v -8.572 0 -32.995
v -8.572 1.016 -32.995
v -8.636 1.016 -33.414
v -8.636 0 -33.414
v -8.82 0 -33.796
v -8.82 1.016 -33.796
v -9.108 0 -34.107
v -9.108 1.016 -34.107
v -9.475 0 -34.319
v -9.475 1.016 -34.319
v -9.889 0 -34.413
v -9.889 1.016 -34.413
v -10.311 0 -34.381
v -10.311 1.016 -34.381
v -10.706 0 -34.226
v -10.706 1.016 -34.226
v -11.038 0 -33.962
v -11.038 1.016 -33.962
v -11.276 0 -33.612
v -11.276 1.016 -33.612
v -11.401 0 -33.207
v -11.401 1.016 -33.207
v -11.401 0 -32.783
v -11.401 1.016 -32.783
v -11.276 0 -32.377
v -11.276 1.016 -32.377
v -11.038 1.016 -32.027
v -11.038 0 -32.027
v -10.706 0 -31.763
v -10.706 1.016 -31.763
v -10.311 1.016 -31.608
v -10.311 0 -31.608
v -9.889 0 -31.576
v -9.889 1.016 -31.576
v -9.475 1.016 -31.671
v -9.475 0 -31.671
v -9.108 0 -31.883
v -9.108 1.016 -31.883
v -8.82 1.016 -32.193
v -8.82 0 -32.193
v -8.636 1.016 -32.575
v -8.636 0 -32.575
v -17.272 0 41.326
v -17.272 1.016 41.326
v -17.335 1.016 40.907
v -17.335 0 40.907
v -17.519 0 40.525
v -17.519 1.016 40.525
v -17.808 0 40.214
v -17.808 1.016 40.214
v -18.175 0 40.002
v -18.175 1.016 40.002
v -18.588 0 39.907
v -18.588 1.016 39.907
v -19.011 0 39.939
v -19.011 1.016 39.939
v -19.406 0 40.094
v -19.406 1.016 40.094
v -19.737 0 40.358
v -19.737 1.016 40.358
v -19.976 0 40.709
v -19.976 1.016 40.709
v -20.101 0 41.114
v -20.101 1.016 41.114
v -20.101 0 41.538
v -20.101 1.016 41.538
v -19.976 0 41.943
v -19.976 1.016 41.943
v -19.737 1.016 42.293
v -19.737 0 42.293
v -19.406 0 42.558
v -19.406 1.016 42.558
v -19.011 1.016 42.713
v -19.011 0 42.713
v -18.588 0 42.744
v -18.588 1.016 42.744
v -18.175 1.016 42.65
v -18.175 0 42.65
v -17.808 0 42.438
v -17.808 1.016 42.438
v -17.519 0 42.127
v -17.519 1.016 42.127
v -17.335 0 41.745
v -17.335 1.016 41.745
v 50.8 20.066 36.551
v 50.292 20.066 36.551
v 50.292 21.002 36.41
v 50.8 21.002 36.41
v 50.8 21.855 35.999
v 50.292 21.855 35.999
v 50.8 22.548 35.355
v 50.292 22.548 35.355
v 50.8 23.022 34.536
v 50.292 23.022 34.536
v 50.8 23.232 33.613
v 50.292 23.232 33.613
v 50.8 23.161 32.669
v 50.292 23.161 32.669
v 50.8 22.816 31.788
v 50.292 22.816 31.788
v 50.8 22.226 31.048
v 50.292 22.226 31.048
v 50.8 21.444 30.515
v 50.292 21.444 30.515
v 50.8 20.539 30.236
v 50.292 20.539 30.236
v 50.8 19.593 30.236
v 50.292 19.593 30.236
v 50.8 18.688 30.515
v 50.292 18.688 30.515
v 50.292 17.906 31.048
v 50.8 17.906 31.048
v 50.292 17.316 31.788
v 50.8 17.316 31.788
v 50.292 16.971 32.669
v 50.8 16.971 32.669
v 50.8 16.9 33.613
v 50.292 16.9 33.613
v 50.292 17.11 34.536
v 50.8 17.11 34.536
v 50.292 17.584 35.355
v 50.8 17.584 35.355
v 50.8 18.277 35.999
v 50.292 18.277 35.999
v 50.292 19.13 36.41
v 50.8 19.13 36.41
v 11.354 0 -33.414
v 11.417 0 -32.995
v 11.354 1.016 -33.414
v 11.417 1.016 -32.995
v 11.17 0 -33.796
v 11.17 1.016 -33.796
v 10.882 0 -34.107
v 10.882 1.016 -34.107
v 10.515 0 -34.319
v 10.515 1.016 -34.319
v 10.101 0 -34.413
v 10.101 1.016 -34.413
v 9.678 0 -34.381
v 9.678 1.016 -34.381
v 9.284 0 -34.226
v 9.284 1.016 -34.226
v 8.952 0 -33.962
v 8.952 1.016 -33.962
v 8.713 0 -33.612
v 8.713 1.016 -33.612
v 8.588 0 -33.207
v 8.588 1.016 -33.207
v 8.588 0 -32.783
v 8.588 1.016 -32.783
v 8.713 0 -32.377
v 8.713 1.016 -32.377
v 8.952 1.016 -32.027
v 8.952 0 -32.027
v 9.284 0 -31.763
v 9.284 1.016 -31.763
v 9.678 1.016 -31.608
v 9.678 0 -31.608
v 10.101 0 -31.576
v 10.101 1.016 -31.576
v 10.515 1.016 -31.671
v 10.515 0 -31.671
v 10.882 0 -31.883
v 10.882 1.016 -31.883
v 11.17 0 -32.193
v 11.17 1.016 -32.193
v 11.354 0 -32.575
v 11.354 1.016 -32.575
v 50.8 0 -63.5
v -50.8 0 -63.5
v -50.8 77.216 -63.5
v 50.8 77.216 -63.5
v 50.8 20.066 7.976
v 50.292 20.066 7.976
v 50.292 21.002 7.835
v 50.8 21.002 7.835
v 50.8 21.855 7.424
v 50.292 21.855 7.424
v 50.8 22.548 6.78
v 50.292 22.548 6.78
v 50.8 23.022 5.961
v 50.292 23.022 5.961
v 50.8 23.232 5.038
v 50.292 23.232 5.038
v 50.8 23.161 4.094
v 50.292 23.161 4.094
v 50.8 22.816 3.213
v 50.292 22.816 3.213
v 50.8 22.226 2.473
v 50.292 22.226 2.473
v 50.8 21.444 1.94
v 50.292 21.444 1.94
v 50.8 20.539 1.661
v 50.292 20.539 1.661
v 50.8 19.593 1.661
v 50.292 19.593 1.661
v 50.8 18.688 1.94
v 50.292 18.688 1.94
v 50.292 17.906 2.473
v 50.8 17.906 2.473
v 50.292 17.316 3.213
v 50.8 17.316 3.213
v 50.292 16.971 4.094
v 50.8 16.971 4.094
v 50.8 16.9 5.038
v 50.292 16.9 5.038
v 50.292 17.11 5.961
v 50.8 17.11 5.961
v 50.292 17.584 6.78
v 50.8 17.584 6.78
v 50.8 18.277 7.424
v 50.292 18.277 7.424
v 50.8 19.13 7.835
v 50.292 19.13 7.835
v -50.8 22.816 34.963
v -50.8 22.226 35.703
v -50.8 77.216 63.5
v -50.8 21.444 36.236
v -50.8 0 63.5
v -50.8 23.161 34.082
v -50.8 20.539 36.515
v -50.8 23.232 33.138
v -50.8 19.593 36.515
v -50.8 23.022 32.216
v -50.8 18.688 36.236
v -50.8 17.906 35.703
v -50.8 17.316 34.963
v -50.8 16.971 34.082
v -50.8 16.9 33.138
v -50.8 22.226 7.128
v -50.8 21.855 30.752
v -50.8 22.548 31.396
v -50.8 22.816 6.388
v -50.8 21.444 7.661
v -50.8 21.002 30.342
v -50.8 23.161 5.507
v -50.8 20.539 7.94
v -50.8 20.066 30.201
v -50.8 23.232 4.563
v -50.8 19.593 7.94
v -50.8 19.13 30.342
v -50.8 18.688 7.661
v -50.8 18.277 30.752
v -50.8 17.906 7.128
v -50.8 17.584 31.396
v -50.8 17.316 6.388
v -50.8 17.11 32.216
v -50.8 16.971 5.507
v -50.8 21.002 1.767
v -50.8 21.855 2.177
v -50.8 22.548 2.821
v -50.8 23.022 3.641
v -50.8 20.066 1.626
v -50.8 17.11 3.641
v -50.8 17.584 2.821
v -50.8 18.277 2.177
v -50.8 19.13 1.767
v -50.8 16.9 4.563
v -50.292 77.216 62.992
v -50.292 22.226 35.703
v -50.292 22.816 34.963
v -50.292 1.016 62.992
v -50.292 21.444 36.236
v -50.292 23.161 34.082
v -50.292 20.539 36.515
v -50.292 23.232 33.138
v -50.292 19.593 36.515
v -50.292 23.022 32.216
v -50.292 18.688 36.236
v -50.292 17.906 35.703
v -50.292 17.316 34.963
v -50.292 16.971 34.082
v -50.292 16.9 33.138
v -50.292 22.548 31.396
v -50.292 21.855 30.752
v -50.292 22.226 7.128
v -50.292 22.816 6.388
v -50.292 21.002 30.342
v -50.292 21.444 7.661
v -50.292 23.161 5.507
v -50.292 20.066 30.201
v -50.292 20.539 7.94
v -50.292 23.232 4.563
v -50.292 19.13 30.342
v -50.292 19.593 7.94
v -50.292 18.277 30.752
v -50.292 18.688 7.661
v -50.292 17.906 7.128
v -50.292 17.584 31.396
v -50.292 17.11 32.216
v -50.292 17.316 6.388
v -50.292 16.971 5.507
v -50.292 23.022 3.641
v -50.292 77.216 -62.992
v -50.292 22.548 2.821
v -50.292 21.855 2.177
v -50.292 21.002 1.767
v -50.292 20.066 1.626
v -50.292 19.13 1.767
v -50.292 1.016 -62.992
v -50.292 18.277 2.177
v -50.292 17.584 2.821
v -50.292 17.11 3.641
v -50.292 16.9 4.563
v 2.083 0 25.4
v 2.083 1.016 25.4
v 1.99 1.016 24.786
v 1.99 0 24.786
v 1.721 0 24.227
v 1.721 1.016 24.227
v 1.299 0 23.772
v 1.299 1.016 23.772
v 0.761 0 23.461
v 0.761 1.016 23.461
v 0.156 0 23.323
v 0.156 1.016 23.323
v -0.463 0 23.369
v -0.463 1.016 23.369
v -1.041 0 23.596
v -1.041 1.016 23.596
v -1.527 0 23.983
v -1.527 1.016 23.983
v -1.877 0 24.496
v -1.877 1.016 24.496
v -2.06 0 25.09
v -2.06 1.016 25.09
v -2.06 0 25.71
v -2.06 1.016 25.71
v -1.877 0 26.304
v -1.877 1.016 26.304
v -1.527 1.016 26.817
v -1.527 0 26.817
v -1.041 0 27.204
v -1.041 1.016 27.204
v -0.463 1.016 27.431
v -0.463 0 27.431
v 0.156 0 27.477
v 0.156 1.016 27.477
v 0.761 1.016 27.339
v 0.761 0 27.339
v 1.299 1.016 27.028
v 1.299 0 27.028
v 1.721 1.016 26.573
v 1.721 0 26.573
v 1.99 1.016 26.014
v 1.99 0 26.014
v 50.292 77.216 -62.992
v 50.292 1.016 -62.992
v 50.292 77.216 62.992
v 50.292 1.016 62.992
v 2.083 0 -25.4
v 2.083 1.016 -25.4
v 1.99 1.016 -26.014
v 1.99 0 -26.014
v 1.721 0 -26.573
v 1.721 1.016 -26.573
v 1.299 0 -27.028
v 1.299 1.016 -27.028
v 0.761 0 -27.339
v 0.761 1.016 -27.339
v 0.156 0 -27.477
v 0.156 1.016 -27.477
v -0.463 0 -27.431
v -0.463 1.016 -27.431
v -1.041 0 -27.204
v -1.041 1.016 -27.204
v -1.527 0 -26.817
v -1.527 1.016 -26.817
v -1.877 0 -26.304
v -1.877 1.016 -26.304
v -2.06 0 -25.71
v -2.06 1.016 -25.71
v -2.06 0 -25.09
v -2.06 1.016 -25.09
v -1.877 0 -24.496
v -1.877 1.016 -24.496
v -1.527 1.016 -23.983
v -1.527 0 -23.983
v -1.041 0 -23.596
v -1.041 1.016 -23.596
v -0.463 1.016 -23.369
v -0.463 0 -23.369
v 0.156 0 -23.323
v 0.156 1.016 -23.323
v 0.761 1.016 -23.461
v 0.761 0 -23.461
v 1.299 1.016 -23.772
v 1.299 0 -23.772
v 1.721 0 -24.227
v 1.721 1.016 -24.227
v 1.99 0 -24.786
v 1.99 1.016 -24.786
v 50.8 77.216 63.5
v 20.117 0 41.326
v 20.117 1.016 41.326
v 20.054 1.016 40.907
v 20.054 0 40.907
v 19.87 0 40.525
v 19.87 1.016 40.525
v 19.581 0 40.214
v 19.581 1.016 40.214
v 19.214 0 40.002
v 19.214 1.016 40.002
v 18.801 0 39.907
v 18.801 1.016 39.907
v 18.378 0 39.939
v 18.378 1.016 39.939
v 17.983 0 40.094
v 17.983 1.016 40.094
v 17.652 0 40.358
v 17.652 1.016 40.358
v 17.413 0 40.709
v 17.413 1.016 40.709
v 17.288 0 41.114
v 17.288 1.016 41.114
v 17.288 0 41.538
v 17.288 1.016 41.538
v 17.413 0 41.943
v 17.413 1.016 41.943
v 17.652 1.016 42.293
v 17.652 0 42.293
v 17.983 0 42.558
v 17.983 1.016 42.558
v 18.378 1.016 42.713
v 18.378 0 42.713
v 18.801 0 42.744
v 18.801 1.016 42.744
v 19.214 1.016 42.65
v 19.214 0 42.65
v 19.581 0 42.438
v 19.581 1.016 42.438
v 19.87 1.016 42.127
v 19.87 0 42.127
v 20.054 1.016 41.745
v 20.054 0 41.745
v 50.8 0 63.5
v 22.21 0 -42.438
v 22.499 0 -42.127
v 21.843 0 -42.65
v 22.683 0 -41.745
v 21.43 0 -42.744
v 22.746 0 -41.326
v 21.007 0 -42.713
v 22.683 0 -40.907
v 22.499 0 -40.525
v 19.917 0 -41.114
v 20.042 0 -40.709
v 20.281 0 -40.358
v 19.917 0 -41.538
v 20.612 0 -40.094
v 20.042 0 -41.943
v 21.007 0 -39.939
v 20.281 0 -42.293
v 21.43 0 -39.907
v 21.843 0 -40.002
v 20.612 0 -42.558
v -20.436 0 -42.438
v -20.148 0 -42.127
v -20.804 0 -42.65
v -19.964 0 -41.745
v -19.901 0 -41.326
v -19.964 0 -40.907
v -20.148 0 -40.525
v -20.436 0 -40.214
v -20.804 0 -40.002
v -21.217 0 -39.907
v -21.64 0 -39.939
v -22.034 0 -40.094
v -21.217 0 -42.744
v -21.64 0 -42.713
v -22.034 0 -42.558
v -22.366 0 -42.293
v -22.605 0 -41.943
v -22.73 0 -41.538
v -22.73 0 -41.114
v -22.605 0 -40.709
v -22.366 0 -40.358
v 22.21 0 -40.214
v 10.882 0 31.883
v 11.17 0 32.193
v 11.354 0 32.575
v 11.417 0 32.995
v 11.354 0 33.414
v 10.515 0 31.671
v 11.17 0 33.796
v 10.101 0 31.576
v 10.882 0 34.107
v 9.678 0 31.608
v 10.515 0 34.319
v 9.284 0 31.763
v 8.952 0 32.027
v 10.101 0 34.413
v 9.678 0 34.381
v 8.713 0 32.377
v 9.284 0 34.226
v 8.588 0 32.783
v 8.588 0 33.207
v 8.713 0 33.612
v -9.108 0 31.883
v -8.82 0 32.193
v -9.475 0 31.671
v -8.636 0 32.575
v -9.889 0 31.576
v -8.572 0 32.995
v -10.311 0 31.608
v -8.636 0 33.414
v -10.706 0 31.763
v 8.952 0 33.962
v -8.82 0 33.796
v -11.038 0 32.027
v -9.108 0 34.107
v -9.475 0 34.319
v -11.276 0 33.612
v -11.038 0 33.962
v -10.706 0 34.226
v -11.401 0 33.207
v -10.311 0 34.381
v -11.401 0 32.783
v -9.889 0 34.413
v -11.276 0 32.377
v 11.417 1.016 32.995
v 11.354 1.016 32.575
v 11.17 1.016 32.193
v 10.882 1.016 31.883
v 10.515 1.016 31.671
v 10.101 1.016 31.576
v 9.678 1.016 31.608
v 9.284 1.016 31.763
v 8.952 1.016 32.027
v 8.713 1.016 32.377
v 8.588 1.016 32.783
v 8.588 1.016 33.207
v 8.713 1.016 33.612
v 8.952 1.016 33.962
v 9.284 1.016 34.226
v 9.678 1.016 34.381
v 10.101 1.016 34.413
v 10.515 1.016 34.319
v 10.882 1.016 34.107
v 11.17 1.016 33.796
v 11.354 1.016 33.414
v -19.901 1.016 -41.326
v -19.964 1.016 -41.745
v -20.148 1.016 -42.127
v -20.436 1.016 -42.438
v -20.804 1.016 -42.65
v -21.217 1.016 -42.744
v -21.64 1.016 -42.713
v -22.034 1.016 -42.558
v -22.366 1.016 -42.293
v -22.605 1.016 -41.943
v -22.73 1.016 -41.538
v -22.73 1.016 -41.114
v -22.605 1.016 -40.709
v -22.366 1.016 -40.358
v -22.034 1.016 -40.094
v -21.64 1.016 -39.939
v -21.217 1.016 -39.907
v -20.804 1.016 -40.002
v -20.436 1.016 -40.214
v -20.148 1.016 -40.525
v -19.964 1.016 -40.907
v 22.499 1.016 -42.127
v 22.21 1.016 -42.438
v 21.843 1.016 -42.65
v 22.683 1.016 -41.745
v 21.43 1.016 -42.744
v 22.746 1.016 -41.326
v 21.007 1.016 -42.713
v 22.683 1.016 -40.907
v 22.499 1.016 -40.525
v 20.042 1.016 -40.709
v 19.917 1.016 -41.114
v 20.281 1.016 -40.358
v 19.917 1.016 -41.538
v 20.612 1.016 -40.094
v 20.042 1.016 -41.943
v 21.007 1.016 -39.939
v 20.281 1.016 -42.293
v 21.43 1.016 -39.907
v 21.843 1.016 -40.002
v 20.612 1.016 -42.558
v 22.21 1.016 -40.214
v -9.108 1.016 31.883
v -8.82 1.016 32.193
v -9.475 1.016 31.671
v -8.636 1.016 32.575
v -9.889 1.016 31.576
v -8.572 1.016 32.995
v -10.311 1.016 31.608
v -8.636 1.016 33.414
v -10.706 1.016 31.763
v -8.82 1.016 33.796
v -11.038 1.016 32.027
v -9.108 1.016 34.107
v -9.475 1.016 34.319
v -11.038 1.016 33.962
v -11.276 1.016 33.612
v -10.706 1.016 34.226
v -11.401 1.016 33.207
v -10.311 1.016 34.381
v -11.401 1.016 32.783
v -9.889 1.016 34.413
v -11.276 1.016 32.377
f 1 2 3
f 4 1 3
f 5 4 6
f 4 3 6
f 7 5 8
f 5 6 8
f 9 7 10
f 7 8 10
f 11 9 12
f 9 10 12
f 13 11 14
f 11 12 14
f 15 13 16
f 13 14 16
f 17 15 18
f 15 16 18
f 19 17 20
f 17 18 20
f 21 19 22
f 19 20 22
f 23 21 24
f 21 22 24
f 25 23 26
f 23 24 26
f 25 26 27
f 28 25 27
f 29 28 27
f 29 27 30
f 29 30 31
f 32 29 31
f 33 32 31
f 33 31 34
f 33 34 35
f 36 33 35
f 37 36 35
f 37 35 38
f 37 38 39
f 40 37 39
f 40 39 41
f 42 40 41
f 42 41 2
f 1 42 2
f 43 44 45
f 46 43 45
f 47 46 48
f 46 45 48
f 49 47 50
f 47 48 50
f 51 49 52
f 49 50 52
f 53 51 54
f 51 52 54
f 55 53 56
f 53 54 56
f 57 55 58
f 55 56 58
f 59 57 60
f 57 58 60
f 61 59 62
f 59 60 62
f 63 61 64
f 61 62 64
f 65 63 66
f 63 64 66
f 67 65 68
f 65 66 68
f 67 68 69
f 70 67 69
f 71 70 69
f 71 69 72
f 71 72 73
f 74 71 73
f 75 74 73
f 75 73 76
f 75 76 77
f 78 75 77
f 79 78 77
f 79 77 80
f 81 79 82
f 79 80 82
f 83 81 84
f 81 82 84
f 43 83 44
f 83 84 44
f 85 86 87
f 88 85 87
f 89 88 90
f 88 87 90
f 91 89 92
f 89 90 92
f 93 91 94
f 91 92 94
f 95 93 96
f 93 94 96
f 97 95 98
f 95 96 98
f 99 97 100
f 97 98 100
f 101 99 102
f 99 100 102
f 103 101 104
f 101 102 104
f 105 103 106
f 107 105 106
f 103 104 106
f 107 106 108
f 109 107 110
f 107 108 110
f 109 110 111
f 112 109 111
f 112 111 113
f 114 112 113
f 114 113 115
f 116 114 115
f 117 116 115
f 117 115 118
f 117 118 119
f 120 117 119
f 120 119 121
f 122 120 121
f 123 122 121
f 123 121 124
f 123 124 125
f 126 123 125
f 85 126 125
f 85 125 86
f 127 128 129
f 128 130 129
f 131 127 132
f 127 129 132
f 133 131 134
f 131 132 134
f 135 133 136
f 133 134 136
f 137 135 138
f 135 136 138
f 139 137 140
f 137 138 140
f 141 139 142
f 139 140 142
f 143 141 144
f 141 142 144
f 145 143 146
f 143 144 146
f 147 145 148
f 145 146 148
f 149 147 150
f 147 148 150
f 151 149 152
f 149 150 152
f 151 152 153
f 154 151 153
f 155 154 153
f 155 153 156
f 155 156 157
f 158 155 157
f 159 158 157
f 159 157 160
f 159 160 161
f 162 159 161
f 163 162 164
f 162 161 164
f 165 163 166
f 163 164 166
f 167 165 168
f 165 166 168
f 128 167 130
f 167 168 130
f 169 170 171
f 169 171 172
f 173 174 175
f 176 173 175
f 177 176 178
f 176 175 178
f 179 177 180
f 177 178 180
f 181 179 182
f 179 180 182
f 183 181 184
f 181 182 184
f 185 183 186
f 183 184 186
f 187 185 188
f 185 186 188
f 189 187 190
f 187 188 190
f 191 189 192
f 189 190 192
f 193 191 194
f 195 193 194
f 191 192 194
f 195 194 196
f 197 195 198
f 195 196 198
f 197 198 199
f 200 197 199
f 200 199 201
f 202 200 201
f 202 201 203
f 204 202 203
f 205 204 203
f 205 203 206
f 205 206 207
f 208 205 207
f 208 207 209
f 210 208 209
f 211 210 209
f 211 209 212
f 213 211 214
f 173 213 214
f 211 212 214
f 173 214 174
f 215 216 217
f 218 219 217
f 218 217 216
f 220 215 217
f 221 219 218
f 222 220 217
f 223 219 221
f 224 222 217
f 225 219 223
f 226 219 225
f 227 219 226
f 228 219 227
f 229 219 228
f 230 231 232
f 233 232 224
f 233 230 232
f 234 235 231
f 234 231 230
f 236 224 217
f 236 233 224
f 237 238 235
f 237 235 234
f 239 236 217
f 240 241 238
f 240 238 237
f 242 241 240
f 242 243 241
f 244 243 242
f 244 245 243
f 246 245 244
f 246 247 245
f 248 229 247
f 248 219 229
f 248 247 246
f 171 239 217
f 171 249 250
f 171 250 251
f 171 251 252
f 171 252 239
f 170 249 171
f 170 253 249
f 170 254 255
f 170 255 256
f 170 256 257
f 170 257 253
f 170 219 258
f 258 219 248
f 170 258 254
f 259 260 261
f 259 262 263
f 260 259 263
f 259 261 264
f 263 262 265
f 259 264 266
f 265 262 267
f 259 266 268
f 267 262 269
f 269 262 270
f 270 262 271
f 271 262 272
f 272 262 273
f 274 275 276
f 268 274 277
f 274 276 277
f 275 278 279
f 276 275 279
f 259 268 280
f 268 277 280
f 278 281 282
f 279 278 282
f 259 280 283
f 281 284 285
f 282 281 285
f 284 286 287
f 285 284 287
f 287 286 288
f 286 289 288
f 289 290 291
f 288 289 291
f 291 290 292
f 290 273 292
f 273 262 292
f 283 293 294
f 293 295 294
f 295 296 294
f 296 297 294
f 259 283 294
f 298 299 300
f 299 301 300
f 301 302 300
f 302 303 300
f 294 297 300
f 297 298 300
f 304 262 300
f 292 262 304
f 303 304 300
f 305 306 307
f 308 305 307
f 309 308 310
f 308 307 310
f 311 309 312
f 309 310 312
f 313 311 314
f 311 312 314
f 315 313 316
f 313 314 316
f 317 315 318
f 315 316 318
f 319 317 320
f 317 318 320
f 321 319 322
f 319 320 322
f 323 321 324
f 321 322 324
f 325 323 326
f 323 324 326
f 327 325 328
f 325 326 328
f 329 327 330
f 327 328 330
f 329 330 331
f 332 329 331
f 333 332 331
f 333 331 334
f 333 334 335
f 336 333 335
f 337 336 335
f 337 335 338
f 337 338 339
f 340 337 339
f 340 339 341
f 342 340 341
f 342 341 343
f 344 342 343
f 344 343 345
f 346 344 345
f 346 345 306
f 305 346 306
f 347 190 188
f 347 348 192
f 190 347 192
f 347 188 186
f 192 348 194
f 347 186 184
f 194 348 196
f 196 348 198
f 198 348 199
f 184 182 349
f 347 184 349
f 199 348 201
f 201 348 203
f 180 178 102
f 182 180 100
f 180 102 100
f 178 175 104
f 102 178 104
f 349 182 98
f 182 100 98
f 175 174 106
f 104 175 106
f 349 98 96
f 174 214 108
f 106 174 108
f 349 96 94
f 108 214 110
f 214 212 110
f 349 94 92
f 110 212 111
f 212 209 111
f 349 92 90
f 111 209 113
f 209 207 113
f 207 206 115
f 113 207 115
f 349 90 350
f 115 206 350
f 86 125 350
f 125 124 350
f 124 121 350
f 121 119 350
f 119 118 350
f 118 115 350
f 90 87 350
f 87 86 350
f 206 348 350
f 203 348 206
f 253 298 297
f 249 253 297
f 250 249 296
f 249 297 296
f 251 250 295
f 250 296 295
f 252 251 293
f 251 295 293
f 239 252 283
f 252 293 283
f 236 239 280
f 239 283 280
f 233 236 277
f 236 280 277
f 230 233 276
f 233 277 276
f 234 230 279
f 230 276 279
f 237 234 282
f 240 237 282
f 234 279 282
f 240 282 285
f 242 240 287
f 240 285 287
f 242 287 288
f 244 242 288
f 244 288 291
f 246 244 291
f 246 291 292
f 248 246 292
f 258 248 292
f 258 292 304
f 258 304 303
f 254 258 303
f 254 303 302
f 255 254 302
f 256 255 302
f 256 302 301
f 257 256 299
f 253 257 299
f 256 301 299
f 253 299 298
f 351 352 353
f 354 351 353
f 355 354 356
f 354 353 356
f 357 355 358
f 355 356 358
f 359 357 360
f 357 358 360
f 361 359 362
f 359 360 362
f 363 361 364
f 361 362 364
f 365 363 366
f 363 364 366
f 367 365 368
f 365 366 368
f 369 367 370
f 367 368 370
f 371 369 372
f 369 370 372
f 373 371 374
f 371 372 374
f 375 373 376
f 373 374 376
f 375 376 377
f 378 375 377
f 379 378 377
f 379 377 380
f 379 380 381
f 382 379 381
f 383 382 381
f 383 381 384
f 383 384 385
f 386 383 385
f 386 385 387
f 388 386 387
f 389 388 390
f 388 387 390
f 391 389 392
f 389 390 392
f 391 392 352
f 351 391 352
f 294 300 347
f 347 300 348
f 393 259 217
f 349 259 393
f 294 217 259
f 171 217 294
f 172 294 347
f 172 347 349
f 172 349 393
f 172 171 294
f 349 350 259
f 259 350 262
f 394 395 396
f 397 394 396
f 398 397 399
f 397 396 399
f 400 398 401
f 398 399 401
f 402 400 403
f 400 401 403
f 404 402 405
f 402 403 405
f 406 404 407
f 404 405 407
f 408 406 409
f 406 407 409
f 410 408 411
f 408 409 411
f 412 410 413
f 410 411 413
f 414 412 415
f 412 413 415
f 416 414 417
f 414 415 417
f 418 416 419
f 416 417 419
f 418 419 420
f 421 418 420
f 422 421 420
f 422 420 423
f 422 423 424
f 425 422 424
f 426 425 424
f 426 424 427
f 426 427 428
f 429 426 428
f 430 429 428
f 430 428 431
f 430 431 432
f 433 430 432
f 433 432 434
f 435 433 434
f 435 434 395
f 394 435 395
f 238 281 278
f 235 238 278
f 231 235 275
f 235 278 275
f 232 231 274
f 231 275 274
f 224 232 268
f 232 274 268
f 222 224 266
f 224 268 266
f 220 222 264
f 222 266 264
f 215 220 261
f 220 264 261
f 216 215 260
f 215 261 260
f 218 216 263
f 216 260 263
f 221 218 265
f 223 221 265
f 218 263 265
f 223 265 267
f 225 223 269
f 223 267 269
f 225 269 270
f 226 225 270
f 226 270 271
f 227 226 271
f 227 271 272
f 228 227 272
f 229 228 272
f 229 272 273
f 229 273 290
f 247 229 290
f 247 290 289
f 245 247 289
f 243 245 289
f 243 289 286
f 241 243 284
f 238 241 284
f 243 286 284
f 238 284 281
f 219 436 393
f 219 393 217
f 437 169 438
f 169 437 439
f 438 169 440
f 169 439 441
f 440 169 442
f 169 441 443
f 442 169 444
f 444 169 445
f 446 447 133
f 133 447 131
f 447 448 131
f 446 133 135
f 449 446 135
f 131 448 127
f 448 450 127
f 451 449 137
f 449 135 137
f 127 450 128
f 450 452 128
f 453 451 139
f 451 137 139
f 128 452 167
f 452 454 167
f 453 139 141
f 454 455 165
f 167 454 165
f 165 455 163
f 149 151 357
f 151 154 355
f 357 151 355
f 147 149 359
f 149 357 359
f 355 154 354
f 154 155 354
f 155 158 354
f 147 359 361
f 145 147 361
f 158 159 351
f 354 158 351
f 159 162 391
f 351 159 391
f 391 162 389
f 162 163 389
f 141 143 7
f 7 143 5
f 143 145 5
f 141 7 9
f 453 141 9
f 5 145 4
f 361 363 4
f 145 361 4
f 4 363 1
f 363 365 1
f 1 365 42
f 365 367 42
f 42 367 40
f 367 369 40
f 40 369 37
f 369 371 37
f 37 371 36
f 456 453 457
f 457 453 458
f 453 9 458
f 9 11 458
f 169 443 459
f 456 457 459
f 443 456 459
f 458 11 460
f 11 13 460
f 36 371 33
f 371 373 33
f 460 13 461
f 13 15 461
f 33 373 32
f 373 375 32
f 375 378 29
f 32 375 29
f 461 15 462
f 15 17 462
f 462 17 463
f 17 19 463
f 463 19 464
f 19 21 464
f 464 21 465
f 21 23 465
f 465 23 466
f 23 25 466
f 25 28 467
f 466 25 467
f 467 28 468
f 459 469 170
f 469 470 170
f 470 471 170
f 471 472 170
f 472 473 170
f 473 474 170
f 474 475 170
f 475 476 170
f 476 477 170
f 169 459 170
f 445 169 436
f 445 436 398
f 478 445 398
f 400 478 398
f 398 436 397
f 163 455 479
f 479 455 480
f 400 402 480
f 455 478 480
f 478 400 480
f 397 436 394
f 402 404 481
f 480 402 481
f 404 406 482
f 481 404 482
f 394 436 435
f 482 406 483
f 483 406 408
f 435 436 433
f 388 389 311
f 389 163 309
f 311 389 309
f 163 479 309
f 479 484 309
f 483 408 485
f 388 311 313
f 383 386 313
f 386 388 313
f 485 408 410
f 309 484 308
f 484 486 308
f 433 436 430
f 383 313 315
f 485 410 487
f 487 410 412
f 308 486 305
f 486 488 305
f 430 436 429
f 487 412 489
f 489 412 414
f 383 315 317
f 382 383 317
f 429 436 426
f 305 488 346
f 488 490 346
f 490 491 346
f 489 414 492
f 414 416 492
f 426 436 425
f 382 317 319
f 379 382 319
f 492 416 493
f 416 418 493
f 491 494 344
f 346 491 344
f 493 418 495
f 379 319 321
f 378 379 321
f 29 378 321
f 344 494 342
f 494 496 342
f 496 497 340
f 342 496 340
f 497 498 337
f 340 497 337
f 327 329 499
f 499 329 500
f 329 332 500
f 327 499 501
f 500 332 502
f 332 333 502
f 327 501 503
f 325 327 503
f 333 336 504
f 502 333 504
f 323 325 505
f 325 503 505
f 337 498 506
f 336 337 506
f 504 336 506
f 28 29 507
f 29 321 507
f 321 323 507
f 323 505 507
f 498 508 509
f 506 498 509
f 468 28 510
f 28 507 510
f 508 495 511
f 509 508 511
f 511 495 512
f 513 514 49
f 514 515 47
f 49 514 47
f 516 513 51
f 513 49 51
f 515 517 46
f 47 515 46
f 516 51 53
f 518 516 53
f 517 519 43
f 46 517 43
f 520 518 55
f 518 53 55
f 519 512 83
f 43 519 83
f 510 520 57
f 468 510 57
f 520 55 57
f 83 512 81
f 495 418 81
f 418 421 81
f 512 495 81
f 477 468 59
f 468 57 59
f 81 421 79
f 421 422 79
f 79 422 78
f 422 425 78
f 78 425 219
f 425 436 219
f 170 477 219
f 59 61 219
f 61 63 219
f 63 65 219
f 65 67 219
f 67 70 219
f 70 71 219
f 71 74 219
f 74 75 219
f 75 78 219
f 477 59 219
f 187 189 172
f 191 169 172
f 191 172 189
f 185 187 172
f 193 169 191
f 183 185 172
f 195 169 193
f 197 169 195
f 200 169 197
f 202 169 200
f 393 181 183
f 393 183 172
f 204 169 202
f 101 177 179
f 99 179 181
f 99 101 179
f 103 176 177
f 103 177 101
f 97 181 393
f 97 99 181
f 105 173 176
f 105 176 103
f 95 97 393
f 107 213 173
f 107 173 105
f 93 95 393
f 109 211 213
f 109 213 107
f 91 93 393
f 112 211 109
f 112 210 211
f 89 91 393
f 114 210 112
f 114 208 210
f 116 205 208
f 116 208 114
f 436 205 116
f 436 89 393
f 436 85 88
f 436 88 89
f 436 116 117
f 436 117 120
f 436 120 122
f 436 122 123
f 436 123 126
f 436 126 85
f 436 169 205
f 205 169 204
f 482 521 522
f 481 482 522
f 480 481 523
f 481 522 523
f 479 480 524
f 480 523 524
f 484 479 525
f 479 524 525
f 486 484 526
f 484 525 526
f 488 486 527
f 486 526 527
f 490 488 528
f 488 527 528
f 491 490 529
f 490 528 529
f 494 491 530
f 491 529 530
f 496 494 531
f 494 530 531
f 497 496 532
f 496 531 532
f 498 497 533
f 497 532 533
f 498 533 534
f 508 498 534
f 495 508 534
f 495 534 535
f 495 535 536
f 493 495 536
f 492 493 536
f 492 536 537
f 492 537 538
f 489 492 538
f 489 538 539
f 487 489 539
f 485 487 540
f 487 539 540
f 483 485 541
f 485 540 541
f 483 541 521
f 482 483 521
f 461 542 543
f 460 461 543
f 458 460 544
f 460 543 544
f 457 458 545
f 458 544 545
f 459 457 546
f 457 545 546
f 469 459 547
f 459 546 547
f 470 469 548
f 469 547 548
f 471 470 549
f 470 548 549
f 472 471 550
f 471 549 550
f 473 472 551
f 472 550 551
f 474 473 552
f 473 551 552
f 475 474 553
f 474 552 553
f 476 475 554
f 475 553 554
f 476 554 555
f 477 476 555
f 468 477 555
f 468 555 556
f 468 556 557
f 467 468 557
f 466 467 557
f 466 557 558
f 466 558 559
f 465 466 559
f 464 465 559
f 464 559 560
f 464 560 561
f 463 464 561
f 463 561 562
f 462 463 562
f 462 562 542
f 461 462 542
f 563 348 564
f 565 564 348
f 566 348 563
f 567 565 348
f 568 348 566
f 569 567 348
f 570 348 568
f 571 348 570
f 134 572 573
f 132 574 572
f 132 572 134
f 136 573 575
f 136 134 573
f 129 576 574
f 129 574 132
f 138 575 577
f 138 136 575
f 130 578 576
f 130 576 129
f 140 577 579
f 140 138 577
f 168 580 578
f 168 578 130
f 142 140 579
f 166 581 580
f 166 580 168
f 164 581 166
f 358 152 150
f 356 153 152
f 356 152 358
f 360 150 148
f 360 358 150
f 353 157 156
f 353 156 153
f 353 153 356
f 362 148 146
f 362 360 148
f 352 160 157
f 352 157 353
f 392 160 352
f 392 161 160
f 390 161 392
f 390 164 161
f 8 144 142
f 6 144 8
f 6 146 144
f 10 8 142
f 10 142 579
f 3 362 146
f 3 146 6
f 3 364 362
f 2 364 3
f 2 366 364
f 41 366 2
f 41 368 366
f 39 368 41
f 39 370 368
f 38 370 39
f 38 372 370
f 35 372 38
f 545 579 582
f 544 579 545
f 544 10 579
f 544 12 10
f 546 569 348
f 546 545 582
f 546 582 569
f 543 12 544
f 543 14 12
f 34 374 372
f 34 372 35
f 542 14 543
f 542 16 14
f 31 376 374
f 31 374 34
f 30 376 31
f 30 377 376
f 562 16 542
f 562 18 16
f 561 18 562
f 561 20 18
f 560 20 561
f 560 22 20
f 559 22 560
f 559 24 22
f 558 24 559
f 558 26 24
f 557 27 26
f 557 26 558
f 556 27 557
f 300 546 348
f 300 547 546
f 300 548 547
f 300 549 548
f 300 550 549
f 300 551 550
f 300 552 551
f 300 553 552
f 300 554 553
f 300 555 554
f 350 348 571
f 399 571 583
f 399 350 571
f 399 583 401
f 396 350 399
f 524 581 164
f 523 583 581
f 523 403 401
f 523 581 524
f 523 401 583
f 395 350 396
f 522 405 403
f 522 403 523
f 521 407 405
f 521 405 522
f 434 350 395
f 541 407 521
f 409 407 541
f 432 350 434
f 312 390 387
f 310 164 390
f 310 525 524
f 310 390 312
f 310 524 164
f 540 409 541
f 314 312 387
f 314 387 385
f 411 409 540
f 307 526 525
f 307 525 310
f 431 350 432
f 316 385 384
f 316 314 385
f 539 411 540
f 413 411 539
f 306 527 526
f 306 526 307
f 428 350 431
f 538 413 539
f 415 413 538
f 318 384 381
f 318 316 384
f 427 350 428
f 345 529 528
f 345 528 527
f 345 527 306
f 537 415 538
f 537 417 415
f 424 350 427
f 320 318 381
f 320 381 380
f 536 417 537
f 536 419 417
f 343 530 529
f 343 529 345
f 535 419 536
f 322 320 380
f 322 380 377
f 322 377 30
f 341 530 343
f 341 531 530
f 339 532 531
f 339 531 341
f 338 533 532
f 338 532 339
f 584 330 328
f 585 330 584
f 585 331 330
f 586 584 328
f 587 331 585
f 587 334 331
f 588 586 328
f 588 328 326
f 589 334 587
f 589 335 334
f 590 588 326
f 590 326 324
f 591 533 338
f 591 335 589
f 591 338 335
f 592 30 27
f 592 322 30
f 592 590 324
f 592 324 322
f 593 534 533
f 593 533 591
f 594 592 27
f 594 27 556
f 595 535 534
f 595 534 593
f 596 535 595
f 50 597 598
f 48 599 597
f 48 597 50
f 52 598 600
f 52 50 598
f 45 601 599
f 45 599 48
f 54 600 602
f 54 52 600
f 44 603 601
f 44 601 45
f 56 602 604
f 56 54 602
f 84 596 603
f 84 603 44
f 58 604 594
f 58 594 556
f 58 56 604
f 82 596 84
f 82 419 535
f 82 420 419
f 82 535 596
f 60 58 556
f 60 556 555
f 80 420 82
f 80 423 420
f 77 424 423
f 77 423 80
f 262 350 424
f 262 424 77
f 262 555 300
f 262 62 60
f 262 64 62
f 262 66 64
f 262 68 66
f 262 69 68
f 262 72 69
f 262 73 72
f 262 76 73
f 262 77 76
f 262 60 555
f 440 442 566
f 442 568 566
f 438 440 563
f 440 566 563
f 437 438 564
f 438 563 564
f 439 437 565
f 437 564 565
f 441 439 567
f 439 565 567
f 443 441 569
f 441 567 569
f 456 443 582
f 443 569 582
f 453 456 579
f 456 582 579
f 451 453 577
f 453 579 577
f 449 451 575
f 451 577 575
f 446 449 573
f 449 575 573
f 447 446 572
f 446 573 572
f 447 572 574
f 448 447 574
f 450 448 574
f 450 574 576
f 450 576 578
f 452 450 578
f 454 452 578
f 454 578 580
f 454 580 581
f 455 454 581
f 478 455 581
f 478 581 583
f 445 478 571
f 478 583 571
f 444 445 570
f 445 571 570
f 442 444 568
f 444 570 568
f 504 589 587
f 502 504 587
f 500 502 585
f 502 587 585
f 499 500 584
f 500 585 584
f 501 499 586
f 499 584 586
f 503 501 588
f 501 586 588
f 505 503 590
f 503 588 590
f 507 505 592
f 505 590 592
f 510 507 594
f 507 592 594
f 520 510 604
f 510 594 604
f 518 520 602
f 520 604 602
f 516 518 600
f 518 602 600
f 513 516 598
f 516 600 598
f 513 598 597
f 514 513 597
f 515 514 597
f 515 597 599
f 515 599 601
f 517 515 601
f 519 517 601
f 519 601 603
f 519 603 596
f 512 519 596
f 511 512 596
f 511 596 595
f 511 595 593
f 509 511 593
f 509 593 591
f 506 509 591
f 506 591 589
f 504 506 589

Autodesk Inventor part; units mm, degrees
ref_plane "YZ Plane" through (0, 0, 0) normal (1, 0, 0) x (0, 1, 0)
ref_plane "XZ Plane" through (0, 0, 0) normal (0, 1, 0) x (-1, 0, 0)
ref_plane "XY Plane" through (0, 0, 0) normal (0, 0, 1) x (1, 0, 0)
sketch "Sketch1" plane through (0, 0, 0) normal (0, 1, 0) x (-1, 0, 0)
  line L0 (-50.8, 63.5) -> (50.8, 63.5)
  line L1 (50.8, 63.5) -> (50.8, -63.5)
  line L2 (50.8, -63.5) -> (-50.8, -63.5)
  line L3 (-50.8, -63.5) -> (-50.8, 63.5)
  line L4 (-50.8, 63.5) -> (50.8, -63.5) construction
  line L5 (50.8, 63.5) -> (-50.8, -63.5) construction
  point P0 (0, 0)
  dimension "d0" = 101.6
  dimension "d1" = 127
extrude "Extrusion1" add sketch "Sketch1" along normal blind 1.016
sketch "Sketch2" plane through (0, 1.016, 0) normal (0, 1, 0) x (1, 0, 0)
  line L0 (50.8, 63.5) -> (-50.8, 63.5) projected
  line L1 (50.8, -63.5) -> (-50.8, -63.5)
  line L2 (-50.8, -63.5) -> (-50.8, 63.5)
  line L3 (-50.8, 63.5) -> (50.8, 63.5)
  line L4 (50.8, 63.5) -> (50.8, -63.5)
  line L5 (50.8, -63.5) -> (-50.8, 63.5) construction
  line L6 (-50.8, -63.5) -> (50.8, 63.5) construction
  line L7 (50.292, -62.992) -> (-50.292, -62.992)
  line L8 (-50.292, -62.992) -> (-50.292, 62.992)
  line L9 (-50.292, 62.992) -> (50.292, 62.992)
  line L10 (50.292, 62.992) -> (50.292, -62.992)
  line L11 (50.292, -62.992) -> (-50.292, 62.992) construction
  line L12 (-50.292, -62.992) -> (50.292, 62.992) construction
  point P0 (0, 0)
  dimension "d4" = 100.584
  dimension "d5" = 125.984
extrude "Extrusion2" add sketch "Sketch2" along normal blind 76.2
sketch "Sketch3" plane through (0, 1.016, 0) normal (0, 1, 0) x (1, 0, 0)
  line L0 (0, 0) -> (0, -25.4)
  line L1 (0, -25.4) -> (0, 25.4)
  circle A0 centre (0, -25.4) radius 2.0828
  circle A1 centre (0, 25.4) radius 2.0828
  dimension "d8" = 25.4
  dimension "d9" = 50.8
  dimension "d10" = 4.1656
  dimension "d11" = 4.1656
extrude "Extrusion3" cut sketch "Sketch3" against normal through all
sketch "Sketch4" plane through (0, 1.016, 0) normal (0, 1, 0) x (1, 0, 0)
  line L0 (24.4983, -44.5008) -> (-24.4983, -44.5008)
  line L1 (-24.4983, 44.5008) -> (24.4983, 44.5008)
  line L2 (24.4983, 44.5008) -> (24.4983, -44.5008)
  line L3 (24.4983, -44.5008) -> (-24.4983, 44.5008) construction
  line L4 (-24.4983, -44.5008) -> (24.4983, 44.5008) construction
  line L5 (21.8694, -44.5008) -> (-21.8694, -44.5008)
  line L6 (-21.8694, 44.5008) -> (21.8694, 44.5008)
  line L7 (21.8694, -44.5008) -> (-21.8694, 44.5008) construction
  line L8 (-21.8694, -44.5008) -> (21.8694, 44.5008) construction
  line L9 (24.4983, 44.5008) -> (-24.4983, 44.5008)
  line L10 (-24.4983, 44.5008) -> (-24.4983, -24.511)
  line L11 (24.4983, -24.511) -> (24.4983, 44.5008)
  line L12 (-21.8694, -44.5008) -> (-18.6944, -44.5008)
  line L13 (21.8694, -44.5008) -> (18.6944, -44.5008)
  line L14 (24.4983, 44.5008) -> (21.3233, 44.5008)
  line L15 (24.4983, 41.3258) -> (24.4983, 44.5008)
  line L16 (-24.4983, 44.5008) -> (-21.3233, 44.5008)
  line L17 (-24.4983, 41.3258) -> (-24.4983, 44.5008)
  circle A0 centre (-18.6944, -41.3258) radius 1.4224
  circle A1 centre (-21.3233, 41.3258) radius 1.4224
  circle A2 centre (21.3233, 41.3258) radius 1.4224
  circle A3 centre (18.6944, -41.3258) radius 1.4224
  point P0 (0, 0)
  dimension "d14" = 48.9966
  dimension "d15" = 89.0016
  dimension "d16" = 43.7388
  dimension "d17" = 89.0016
  dimension "d18" = 69.0118
  dimension "d27" = 2.8448
  dimension "d28" = 2.8448
  dimension "d29" = 2.8448
  dimension "d30" = 2.8448
extrude "Extrusion4" cut sketch "Sketch4" against normal through all
sketch "Sketch5" plane through (0, 1.016, 0) normal (0, 1, 0) x (1, 0, 0)
  line L0 (9.9949, -32.9946) -> (-9.9949, -32.9946)
  line L1 (-9.9949, 32.9946) -> (9.9949, 32.9946)
  line L2 (9.9949, 32.9946) -> (9.9949, -32.9946)
  line L3 (9.9949, -32.9946) -> (-9.9949, 32.9946) construction
  line L4 (-9.9949, -32.9946) -> (9.9949, 32.9946) construction
  circle A0 centre (-9.9949, -32.9946) radius 1.4224
  circle A1 centre (9.9949, -32.9946) radius 1.4224
  circle A2 centre (9.9949, 32.9946) radius 1.4224
  circle A3 centre (-9.9949, 32.9946) radius 1.4224
  point P0 (0, 0)
  dimension "d33" = 19.9898
  dimension "d34" = 65.9892
  dimension "d35" = 2.8448
  dimension "d36" = 2.8448
  dimension "d37" = 2.8448
  dimension "d38" = 2.8448
extrude "Extrusion5" cut sketch "Sketch5" against normal through all
sketch "Sketch6" plane through (-50.292, 1.016, 62.992) normal (1, 0, 0) x (0, 0, -1)
  line L0 (0, 0) -> (0, 76.2) projected
  line L1 (0, 19.05) -> (18.4912, 19.05)
  line L2 (0, 19.05) -> (18.4912, 19.05) construction
  line L3 (18.4912, 19.05) -> (29.6164, 19.05)
  line L4 (29.6164, 19.05) -> (58.1914, 19.05)
  circle A0 centre (29.6164, 19.05) radius 3.175
  circle A1 centre (58.1914, 19.05) radius 3.175
  point P0 (62.992, -1.016)
  dimension "d41" = 18.4912
  dimension "d42" = 0
  dimension "d43" = 11.1252
  dimension "d44" = 28.575
  dimension "d45" = 180
  dimension "d46" = 6.35
  dimension "d47" = 6.35
extrude "Extrusion6" cut sketch "Sketch6" against normal through all
sketch "Sketch7" plane through (50.292, 1.016, -62.992) normal (-1, 0, 0) x (0, 0, 1)
  line L0 (125.984, 0) -> (125.984, 76.2) projected
  line L1 (125.984, 19.05) -> (107.4928, 19.05)
  line L2 (125.984, 19.05) -> (144.4752, 19.05) construction
  line L3 (107.4928, 19.05) -> (96.3676, 19.05)
  line L4 (96.3676, 19.05) -> (67.7926, 19.05)
  circle A0 centre (67.7926, 19.05) radius 3.175
  circle A1 centre (96.3676, 19.05) radius 3.175
  point P0 (62.992, -1.016)
  dimension "d50" = 18.4912
  dimension "d51" = 180
  dimension "d52" = 11.1252
  dimension "d53" = 28.575
  dimension "d54" = 180
  dimension "d55" = 6.35
  dimension "d56" = 6.35
extrude "Extrusion7" cut sketch "Sketch7" against normal through all
properties part number "563-AU1028MG-PE4312"
